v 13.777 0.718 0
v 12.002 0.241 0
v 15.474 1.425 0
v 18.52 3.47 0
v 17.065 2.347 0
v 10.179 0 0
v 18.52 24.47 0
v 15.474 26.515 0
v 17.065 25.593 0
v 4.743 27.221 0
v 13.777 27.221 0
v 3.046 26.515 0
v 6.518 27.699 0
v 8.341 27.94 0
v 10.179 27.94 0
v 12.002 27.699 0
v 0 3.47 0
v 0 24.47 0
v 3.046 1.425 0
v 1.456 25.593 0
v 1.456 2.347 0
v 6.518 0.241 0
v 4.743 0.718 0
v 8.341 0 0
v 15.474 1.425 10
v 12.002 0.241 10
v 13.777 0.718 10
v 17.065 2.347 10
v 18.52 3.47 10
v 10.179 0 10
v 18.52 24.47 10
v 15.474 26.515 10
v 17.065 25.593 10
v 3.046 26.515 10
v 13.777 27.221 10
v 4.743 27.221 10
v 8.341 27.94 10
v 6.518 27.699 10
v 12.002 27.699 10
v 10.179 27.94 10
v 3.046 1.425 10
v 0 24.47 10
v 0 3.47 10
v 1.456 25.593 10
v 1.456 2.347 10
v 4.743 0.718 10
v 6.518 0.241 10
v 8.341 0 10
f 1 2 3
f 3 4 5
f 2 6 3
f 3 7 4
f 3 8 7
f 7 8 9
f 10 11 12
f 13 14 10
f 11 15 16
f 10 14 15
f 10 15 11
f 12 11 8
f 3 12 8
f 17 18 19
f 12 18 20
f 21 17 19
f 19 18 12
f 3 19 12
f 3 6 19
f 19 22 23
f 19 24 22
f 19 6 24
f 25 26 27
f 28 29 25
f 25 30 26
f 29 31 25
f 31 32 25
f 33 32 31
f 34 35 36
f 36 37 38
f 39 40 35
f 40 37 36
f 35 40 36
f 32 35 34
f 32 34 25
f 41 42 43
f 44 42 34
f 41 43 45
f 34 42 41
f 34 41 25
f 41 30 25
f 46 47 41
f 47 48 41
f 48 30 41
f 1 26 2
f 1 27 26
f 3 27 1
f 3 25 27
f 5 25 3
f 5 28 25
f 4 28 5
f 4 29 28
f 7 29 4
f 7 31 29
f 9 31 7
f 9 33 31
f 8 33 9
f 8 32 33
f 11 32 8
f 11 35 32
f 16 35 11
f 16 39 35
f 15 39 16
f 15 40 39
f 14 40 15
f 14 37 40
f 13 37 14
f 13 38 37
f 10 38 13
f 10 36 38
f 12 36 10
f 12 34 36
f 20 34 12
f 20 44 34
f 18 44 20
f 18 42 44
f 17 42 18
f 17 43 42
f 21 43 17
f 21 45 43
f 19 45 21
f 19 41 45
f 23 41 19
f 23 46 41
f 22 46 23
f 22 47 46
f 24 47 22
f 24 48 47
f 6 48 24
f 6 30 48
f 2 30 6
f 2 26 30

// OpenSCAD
$fn = 32;

// ----------------------------------------------------------------------
// Eccentric disc: double_d, 10 mm thick
// ----------------------------------------------------------------------

// --- parameters (mm) ---
profile_height = 10;      // extrusion height
profile_points = 24;      // points of the closed outline

profile = [[18.52, 24.47], [17.065, 25.593], [15.474, 26.515], [13.777, 27.221], [12.002, 27.699], [10.179, 27.94], [8.341, 27.94], [6.518, 27.699], [4.743, 27.221], [3.046, 26.515], [1.456, 25.593], [0, 24.47], [0, 3.47], [1.456, 2.347], [3.046, 1.425], [4.743, 0.718], [6.518, 0.241], [8.341, 0], [10.179, 0], [12.002, 0.241], [13.777, 0.718], [15.474, 1.425], [17.065, 2.347], [18.52, 3.47]];  // single closed polygon, 24 points, counter clockwise

// --- the one profile operation ---
linear_extrude(height = profile_height) polygon(points = profile);
